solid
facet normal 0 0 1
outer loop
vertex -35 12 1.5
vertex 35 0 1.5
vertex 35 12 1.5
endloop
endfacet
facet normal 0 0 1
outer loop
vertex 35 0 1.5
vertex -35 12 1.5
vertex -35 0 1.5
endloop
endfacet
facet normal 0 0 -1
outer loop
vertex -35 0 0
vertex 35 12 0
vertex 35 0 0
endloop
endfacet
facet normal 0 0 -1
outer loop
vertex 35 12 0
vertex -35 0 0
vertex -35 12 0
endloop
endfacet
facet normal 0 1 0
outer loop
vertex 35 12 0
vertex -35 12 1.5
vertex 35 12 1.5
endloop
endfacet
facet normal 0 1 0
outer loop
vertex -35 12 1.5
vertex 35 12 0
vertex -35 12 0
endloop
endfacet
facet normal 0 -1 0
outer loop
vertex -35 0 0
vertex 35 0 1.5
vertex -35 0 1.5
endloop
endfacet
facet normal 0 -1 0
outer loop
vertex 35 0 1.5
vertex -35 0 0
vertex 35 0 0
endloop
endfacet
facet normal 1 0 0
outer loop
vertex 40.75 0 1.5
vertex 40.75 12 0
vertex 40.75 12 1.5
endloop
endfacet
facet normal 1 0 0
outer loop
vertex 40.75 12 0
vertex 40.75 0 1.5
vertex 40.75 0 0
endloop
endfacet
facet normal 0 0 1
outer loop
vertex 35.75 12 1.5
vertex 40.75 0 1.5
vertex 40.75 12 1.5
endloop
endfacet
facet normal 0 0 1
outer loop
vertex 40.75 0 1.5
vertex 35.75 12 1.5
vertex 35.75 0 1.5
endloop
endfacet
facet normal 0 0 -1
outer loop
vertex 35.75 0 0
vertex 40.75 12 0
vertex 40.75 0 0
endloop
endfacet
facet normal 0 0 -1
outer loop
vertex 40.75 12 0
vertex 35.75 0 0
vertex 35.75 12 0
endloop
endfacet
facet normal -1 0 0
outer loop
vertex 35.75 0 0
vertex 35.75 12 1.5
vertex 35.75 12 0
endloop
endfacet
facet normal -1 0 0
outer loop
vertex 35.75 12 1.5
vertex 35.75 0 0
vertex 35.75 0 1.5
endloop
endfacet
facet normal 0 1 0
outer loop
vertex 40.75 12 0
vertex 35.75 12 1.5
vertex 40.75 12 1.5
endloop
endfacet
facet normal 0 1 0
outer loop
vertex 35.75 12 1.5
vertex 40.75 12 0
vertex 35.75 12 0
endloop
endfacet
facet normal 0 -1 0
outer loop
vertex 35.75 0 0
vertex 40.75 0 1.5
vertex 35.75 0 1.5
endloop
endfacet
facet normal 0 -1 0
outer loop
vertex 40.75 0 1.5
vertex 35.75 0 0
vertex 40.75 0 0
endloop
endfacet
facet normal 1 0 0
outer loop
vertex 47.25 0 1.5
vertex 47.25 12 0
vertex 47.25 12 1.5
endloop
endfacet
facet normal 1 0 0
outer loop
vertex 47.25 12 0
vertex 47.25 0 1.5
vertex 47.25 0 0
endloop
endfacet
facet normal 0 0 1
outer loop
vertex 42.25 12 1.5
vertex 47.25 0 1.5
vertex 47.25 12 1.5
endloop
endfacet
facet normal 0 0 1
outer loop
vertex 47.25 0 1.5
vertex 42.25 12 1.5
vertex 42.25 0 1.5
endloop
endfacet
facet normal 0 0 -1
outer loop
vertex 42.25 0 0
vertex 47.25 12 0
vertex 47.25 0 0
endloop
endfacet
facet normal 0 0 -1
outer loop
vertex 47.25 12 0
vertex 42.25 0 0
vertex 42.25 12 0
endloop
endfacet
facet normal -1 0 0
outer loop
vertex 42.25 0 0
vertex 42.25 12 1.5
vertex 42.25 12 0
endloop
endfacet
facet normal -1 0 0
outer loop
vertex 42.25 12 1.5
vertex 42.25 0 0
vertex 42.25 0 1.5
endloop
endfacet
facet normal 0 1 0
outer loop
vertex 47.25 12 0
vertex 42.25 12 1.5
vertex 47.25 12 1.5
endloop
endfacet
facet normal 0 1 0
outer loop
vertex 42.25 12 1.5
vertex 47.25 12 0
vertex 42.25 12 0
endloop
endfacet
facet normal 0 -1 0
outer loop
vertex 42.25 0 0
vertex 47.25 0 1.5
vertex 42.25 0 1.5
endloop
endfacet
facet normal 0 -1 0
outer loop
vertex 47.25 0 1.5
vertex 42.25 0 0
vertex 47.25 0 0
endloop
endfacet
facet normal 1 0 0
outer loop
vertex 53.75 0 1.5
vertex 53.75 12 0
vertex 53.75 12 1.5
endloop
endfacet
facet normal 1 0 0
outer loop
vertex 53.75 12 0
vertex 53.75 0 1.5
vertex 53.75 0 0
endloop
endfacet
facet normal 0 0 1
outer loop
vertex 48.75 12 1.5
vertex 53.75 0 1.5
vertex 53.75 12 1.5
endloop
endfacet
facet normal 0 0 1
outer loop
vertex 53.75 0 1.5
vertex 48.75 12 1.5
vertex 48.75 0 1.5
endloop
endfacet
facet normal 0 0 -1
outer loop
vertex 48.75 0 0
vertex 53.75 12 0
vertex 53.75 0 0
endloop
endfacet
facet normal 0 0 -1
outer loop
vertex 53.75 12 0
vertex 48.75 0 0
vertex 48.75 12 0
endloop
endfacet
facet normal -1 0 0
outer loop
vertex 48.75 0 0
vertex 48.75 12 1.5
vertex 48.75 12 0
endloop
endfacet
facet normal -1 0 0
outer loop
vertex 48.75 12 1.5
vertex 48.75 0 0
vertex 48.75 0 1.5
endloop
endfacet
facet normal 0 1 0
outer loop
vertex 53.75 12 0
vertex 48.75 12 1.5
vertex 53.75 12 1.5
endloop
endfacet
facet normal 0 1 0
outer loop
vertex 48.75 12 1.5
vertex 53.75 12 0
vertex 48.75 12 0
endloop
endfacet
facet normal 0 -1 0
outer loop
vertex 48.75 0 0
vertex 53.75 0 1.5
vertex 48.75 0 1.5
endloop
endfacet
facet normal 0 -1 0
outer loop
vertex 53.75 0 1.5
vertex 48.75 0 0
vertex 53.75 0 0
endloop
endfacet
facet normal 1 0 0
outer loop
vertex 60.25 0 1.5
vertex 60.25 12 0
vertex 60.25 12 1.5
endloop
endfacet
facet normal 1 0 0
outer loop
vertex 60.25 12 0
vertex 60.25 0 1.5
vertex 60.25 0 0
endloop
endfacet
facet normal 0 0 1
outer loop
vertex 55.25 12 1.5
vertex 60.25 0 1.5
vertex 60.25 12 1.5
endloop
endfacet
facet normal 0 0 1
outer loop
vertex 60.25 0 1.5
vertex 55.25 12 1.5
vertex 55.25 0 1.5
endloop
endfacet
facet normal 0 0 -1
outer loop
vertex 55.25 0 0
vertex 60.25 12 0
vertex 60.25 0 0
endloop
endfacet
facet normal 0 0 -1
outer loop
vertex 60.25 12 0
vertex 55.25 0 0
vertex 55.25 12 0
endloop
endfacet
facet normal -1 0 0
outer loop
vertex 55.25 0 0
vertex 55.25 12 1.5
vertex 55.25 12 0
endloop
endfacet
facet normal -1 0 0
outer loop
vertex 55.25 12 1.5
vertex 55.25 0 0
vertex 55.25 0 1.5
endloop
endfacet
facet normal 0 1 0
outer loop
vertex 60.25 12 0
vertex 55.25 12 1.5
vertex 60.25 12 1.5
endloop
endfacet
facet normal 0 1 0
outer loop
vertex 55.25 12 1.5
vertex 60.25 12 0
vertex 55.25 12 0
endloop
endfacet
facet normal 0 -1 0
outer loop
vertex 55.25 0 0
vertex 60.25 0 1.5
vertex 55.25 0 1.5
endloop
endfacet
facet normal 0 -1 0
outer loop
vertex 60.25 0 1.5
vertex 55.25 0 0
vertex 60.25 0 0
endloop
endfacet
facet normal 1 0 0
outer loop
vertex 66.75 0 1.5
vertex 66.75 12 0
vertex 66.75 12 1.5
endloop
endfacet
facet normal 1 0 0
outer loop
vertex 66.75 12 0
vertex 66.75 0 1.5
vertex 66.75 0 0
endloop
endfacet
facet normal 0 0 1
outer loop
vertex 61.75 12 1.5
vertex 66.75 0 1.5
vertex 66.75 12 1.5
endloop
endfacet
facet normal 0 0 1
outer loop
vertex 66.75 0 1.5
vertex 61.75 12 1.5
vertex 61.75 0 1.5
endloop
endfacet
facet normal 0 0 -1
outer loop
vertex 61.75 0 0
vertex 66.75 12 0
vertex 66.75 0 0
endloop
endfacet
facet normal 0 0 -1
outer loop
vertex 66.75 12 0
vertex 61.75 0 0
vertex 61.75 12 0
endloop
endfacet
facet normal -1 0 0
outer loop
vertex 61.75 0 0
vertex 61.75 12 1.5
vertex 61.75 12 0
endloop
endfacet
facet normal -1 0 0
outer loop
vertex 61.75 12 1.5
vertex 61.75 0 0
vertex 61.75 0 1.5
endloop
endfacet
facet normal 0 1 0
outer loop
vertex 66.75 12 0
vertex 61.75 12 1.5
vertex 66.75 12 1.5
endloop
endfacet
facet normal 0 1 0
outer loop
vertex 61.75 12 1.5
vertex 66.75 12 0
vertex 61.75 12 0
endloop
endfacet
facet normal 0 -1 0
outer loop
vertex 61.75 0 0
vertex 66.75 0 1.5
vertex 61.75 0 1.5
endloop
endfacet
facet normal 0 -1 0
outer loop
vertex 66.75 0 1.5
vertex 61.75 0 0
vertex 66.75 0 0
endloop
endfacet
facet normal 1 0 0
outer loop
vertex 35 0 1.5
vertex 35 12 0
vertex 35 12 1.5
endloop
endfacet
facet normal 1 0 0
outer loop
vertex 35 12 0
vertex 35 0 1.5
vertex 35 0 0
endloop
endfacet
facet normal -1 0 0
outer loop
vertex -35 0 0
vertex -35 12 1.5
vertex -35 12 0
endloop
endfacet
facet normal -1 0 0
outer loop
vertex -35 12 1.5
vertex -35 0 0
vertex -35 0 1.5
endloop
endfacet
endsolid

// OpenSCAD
// 10-well agarose gel comb - flat plate with spine and hanging teeth.
// Orientation: Lying flat on XY plane, spine along X, teeth hanging in -Y.

// Dimensions
spine_len = 70;
spine_w   = 12;
plate_thk = 1.5;

tooth_w   = 5.0;
tooth_l   = 12;
tooth_gap = 1.5;
n_teeth   = 10;

$fn = 64;

// Calculate total width of the tooth row
tooth_row_w = n_teeth * tooth_w + (n_teeth - 1) * tooth_gap;

// Calculate position of the tooth row relative to the spine edge
// The teeth hang from the -Y edge of the spine.
// We define the spine as a block from Y=0 to Y=spine_w.
// The teeth start at Y=0 and extend to Y=-tooth_l.
// The tooth row is centred on the spine in X.

module comb() {
    // 1. The Spine (Back Bar)
    // Dimensions: spine_len x spine_w x plate_thk
    // Position: Centred in X, sitting on Z=0.
    // Y range: 0 to spine_w (teeth hang from Y=0)
    translate([-spine_len / 2, 0, 0])
        cube([spine_len, spine_w, plate_thk]);

    // 2. The Teeth
    // We generate the positions for the teeth.
    // The row is centred on the spine in X.
    // The row starts at Y=0 and goes to Y=-tooth_l.
    
    // Calculate the X offset to centre the row on the spine
    spine_half_len = spine_len / 2;
    row_half_w     = tooth_row_w / 2;
    x_offset       = spine_half_len - row_half_w;

    // Generate tooth positions
    // i goes from 0 to n_teeth - 1
    // Position in X: x_offset + i * (tooth_w + tooth_gap)
    // Position in Y: 0 (top of tooth) to -tooth_l (bottom)
    
    for (i = [0 : n_teeth - 1]) {
        tx = x_offset + i * (tooth_w + tooth_gap);
        ty = 0;
        tz = 0;
        
        translate([tx, ty, tz])
            cube([tooth_w, tooth_l, plate_thk]);
    }
}

comb();
